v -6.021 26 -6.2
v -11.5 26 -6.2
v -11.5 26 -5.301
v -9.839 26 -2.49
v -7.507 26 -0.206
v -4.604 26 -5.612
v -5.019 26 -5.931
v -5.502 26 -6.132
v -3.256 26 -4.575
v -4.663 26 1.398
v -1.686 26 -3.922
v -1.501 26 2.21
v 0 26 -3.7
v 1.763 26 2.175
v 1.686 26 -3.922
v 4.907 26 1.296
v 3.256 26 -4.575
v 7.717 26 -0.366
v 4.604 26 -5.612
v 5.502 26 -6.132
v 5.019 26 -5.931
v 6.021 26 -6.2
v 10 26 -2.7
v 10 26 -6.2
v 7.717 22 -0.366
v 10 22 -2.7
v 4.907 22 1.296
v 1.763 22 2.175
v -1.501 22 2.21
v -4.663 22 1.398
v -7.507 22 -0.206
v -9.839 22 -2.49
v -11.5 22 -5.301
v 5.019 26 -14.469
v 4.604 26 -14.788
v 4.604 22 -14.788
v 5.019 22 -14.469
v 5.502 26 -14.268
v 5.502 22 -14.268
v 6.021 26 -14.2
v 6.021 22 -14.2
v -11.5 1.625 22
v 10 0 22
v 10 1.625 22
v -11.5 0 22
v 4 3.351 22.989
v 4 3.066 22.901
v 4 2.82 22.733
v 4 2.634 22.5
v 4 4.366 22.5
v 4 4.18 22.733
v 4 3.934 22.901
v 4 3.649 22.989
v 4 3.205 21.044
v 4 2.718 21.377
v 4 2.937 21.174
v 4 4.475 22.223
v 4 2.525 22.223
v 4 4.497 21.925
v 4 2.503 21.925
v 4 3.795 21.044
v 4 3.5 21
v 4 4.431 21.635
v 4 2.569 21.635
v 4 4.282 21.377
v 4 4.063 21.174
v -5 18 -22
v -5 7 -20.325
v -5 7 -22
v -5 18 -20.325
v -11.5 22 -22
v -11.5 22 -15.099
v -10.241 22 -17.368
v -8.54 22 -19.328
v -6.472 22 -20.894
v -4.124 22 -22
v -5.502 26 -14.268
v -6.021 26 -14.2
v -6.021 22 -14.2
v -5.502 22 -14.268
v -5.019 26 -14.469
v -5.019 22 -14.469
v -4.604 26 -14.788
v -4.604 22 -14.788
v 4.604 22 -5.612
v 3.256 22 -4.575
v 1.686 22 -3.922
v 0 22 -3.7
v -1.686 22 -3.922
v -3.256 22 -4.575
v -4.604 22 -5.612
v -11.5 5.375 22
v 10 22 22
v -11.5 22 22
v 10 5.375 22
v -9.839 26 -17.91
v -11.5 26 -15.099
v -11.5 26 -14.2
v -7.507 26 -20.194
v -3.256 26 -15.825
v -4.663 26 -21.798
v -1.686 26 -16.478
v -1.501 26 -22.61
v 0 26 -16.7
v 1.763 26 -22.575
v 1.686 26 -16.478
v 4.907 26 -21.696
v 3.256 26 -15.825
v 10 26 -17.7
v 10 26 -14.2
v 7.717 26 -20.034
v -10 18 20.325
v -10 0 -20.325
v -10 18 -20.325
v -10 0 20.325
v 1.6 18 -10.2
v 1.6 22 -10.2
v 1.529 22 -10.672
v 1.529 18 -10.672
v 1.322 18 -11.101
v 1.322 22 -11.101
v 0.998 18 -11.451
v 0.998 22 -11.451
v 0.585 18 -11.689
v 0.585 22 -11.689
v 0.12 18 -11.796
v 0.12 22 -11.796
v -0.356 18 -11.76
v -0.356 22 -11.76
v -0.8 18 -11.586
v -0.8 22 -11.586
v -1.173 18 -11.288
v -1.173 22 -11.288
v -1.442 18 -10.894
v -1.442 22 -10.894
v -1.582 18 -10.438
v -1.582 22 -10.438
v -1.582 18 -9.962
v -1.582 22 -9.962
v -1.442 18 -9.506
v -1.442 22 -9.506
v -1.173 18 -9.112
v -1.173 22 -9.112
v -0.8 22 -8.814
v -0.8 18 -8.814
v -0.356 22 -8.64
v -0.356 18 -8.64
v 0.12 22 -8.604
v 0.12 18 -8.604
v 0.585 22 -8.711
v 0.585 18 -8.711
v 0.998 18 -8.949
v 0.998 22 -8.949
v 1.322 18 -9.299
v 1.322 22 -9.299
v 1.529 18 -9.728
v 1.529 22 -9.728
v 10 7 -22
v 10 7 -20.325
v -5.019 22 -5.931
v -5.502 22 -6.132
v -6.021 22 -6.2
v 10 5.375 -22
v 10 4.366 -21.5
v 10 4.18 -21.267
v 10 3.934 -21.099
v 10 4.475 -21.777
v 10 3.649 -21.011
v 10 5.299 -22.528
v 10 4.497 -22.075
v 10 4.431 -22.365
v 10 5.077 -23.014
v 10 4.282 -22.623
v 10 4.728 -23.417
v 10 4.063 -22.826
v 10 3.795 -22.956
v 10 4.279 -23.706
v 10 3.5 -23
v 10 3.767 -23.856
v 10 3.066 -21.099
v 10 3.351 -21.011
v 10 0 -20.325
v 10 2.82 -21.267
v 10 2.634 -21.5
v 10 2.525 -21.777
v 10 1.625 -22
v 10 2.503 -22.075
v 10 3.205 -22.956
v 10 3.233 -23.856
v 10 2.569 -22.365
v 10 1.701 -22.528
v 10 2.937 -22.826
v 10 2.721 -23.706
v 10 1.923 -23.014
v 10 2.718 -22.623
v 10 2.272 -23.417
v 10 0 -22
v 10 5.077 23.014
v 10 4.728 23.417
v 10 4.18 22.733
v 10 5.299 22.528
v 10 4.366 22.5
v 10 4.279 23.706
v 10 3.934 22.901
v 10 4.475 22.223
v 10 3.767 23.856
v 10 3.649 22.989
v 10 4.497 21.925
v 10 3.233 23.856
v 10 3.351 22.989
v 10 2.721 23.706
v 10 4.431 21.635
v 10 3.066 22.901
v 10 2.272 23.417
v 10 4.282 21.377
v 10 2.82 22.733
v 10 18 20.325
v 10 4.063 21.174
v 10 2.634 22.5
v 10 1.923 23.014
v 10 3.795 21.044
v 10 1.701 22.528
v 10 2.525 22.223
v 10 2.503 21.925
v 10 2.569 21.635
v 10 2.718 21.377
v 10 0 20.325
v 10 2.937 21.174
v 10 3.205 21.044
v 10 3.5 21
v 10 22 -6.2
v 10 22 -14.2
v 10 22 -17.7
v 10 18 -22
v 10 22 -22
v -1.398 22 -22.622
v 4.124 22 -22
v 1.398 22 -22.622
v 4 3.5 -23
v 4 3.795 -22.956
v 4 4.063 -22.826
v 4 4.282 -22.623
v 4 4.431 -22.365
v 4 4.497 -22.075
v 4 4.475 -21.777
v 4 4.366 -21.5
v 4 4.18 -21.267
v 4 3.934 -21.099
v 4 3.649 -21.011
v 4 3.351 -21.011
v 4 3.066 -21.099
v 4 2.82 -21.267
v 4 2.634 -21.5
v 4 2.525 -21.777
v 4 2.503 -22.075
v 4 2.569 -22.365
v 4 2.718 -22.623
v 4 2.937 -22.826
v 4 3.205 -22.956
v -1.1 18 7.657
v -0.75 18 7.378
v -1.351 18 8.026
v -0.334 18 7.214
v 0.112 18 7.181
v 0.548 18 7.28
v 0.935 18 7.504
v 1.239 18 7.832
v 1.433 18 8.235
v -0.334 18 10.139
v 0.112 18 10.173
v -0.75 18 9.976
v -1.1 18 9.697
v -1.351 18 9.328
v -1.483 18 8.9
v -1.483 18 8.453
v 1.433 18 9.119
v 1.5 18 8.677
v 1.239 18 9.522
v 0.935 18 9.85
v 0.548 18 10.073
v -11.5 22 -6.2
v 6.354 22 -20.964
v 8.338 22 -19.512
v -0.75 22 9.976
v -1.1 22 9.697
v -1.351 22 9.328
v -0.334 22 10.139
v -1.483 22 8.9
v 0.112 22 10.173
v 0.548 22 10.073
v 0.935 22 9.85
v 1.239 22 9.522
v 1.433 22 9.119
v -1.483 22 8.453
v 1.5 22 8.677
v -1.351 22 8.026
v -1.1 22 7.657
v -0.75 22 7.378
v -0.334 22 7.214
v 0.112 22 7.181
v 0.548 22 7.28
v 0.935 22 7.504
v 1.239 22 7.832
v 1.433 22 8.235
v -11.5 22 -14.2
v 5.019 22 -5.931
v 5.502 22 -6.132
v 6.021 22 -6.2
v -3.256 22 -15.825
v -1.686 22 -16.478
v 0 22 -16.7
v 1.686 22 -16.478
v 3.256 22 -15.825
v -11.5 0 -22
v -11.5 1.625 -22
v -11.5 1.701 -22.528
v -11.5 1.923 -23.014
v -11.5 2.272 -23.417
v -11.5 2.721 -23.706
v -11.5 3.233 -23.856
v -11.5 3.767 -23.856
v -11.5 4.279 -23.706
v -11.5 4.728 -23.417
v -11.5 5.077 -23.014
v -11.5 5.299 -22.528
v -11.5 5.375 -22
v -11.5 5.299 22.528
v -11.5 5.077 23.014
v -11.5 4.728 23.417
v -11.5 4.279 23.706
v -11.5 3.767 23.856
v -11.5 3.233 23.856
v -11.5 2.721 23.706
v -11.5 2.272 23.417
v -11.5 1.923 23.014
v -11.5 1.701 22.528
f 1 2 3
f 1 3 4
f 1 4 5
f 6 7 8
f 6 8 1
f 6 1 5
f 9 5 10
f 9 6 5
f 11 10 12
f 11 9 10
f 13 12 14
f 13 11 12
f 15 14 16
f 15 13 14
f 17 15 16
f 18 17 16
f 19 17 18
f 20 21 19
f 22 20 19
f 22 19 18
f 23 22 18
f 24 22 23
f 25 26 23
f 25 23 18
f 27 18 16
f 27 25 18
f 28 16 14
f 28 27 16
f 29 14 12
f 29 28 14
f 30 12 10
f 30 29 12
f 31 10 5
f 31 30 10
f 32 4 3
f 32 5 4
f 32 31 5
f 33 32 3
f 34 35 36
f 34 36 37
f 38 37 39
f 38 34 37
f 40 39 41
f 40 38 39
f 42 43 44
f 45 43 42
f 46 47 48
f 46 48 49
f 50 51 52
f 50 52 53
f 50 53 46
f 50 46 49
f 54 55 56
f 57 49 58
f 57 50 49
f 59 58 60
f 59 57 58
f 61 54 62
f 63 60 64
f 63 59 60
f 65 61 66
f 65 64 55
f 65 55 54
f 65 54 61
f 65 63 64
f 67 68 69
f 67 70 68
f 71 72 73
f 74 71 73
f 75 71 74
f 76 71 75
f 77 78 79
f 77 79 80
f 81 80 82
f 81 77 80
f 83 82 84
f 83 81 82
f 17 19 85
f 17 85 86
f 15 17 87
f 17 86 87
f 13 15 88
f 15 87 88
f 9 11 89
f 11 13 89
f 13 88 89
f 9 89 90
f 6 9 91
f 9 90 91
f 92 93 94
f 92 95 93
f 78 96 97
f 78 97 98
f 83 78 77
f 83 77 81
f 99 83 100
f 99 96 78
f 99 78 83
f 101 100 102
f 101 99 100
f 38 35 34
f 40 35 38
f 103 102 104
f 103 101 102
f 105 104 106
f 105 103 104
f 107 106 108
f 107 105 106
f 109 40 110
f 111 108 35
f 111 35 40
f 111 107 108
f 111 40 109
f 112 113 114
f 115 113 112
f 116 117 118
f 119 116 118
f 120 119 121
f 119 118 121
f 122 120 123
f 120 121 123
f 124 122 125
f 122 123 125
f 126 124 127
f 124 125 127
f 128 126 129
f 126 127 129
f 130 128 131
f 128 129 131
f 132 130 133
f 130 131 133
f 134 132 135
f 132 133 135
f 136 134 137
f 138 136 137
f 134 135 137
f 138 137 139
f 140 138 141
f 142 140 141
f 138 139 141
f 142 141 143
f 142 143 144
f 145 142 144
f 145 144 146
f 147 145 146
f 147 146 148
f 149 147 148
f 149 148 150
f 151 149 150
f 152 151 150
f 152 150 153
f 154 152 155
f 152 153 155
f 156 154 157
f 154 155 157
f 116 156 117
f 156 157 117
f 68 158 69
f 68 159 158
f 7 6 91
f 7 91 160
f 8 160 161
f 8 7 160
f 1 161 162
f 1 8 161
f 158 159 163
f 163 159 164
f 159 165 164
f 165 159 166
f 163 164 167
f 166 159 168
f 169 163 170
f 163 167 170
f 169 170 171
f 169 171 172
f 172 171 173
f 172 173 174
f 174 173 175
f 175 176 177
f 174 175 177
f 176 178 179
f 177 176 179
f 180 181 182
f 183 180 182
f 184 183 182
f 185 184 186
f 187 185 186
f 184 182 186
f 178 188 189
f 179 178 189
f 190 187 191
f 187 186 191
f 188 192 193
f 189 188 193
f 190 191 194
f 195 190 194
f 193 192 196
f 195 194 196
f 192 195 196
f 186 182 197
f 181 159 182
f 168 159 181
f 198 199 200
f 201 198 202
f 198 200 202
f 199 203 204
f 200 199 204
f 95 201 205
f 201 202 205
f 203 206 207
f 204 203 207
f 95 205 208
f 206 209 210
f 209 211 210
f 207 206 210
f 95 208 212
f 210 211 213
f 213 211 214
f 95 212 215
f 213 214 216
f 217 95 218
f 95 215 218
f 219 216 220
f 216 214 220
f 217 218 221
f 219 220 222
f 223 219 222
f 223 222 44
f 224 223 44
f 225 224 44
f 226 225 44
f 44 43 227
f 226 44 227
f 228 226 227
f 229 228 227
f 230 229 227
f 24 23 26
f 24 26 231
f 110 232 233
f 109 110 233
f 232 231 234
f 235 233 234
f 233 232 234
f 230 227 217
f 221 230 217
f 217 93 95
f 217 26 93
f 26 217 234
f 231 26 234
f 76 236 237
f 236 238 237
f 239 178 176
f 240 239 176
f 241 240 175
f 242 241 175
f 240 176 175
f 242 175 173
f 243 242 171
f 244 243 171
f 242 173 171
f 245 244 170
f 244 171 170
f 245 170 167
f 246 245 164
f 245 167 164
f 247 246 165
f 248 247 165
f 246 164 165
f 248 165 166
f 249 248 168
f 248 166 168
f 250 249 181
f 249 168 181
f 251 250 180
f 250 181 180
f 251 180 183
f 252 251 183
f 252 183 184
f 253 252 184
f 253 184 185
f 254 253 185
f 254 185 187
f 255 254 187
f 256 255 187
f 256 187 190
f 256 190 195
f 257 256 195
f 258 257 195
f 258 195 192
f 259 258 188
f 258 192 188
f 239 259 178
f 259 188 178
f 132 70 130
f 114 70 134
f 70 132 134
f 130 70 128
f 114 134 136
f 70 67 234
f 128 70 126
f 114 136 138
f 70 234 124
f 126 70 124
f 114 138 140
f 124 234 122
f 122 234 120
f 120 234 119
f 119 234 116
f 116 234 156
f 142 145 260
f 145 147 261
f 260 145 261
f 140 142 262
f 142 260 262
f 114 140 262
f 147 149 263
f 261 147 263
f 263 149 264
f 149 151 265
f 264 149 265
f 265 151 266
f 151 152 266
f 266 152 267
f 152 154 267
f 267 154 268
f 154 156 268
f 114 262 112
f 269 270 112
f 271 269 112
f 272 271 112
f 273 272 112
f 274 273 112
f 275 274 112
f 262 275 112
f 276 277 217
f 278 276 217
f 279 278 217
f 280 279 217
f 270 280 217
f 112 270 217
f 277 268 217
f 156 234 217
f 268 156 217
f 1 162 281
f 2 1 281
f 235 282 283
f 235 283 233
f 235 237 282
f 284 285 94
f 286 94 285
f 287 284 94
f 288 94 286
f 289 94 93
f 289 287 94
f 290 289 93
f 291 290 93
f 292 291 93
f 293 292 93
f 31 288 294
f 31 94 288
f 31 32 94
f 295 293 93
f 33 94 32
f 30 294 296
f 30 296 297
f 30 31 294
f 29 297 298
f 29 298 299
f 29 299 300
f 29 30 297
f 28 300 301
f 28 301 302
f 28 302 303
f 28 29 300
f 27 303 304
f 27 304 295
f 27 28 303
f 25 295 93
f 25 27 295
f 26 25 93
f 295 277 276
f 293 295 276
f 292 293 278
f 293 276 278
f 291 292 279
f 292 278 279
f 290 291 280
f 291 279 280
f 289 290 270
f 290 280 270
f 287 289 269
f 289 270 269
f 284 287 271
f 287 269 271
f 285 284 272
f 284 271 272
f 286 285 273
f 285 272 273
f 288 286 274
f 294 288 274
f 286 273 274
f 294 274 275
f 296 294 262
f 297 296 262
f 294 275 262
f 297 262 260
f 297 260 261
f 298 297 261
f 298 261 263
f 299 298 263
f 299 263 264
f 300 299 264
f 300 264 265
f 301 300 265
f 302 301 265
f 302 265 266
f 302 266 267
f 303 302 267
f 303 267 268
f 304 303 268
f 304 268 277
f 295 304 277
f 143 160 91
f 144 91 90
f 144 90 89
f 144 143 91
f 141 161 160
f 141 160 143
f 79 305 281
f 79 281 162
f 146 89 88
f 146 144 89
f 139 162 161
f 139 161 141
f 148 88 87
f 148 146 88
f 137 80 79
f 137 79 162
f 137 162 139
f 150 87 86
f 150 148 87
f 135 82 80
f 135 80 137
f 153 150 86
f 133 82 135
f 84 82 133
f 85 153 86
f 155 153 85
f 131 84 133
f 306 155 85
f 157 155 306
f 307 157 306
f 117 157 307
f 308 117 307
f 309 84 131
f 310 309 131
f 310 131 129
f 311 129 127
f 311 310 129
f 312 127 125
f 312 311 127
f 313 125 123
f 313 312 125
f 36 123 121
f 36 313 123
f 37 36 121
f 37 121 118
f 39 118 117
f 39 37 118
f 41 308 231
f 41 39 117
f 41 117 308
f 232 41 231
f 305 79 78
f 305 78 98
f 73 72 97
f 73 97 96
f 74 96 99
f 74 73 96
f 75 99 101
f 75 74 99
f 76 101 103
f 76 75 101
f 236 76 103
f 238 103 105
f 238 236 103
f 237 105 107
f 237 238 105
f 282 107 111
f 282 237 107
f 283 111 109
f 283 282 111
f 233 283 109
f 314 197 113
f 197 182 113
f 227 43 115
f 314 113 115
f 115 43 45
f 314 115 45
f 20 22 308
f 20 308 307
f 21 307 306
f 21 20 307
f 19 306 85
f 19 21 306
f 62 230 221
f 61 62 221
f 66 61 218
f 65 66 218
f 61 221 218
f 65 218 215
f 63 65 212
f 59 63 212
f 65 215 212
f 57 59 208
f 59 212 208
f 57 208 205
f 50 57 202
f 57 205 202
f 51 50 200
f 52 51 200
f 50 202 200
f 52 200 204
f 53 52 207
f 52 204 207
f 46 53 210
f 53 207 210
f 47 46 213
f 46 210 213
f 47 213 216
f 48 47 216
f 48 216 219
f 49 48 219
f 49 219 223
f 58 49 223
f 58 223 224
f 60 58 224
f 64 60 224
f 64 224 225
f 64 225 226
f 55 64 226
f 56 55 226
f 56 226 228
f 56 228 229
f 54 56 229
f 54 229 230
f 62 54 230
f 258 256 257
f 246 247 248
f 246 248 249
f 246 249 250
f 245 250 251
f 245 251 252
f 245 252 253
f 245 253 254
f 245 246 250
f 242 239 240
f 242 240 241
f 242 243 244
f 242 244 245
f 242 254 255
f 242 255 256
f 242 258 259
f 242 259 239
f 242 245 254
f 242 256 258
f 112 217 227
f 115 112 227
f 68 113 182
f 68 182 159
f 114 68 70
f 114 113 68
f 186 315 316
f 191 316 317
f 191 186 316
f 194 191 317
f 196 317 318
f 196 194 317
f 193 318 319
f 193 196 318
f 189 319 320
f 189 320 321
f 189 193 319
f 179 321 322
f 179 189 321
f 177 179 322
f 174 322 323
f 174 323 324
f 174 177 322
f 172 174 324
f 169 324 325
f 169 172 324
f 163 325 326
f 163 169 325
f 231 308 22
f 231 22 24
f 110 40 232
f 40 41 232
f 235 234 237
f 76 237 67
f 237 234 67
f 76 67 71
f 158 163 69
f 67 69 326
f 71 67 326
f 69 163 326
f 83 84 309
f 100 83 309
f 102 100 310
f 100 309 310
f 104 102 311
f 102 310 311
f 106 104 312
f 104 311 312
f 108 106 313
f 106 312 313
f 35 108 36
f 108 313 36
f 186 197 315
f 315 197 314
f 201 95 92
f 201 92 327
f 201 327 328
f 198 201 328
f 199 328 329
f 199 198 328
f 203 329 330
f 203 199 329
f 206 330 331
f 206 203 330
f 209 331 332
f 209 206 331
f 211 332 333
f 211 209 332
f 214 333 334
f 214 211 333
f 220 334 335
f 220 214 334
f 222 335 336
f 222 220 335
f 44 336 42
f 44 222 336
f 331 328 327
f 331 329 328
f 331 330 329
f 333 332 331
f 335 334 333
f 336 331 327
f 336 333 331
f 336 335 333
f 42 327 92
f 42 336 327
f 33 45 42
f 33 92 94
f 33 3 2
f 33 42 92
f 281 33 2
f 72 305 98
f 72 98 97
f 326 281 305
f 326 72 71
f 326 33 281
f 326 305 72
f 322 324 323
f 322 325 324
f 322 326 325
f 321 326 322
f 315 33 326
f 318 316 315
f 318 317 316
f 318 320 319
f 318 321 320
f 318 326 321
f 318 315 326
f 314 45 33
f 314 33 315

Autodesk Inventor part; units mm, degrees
ref_plane "YZ Plane" through (0, 0, 0) normal (1, 0, 0) x (0, 1, 0)
ref_plane "XZ Plane" through (0, 0, 0) normal (0, 1, 0) x (-1, 0, 0)
ref_plane "XY Plane" through (0, 0, 0) normal (0, 0, 1) x (1, 0, 0)
sketch "Sketch1" plane through (0, 0, 0) normal (0, 1, 0) x (-1, 0, 0)
  line L0 (-10, -20.125) -> (10, -20.125)
  line L1 (10, -20.125) -> (10, 20.125)
  line L2 (10, 20.125) -> (-10, 20.125)
  line L3 (-10, 20.125) -> (-10, -20.125)
  line L4 (-10, -20.125) -> (10, 20.125) construction
  line L5 (10, -20.125) -> (-10, 20.125) construction
  line L6 (-11.5, -22) -> (11.5, -22)
  line L7 (11.5, -22) -> (11.5, 22)
  line L8 (11.5, 22) -> (-11.5, 22)
  line L9 (-11.5, 22) -> (-11.5, -22)
  line L10 (-11.5, -22) -> (11.5, 22) construction
  line L11 (11.5, -22) -> (-11.5, 22) construction
  line L12 (-10, 20.125) -> (-10, 22)
  line L13 (-10, -20.125) -> (-10, -22)
  point P0 (0, 0)
  dimension "d0" = 20
  dimension "d1" = 40.25
  dimension "d2" = 23
  dimension "d3" = 44
extrude "Extrusion1" add sketch "Sketch1" along normal blind 7 contours L0 L1 L2 L12 L8 L7 L6 L13
sketch "Sketch2" plane through (-11.5, 0, -22) normal (-1, 0, 0) x (0, 0, 1)
  line L0 (44, 0) -> (0, 0)
  line L1 (0, 0) -> (0, 22)
  line L2 (0, 22) -> (44, 22)
  line L3 (44, 22) -> (44, 0)
  point P0 (22, 0)
  dimension "d6" = 44
  dimension "d7" = 22
sketch "Sketch3" plane through (0, 7, 0) normal (0, 1, 0) x (1, 0, 0)
  line L0 (-10, -20.125) -> (-10, 20.125) projected
  line L1 (-10, 20.125) -> (10, 20.125) projected
  line L2 (10, 20.125) -> (10, 22) projected
  line L3 (10, 22) -> (-11.5, 22) projected
  line L4 (-11.5, 22) -> (-11.5, -22) projected
  line L5 (-11.5, -22) -> (10, -22) projected
  line L6 (10, -22) -> (10, -20.125) projected
  line L7 (10, -20.125) -> (-10, -20.125) projected
  line L8 (-10, 20.125) -> (-10, 22)
  point P0 (0, 0)
extrude "Extrusion2" add sketch "Sketch3" along normal blind 11 contours L7 L6 L5 L4 L3 L8 L0
sketch "Sketch4" plane through (0, 18, 0) normal (0, 1, 0) x (1, 0, 0)
  line L0 (10, -22) -> (10, -20.125) projected
  line L1 (-10, 22) -> (-11.5, 22) projected
  line L2 (10, -22) -> (-11.5, -22)
  line L3 (-11.5, -22) -> (-11.5, 22)
  line L4 (-11.5, 22) -> (10, 22)
  line L5 (10, 22) -> (10, -22)
  point P0 (0, 0)
extrude "Extrusion3" add sketch "Sketch4" along normal blind 4
sketch "Sketch5" plane through (0, 22, 0) normal (0, 1, 0) x (1, 0, 0)
  line L0 (10, 20.125) -> (10, 22) projected
  line L1 (10, 22) -> (-11.5, 22) projected
  line L2 (10, 22) -> (-11.5, 22)
  circle A0 centre (0, 10.2) radius 6.5
  circle A1 centre (0, 10.2) radius 9
  line L3 (0, 10.2) -> (-11.5, 10.2)
  line L4 (-11.5, 22) -> (-11.5, -22) projected
  line L5 (0, 10.2) -> (0, 14.2)
  line L6 (0, 14.2) -> (-11.5, 14.2)
  line L7 (0, 10.2) -> (0, 6.2)
  line L8 (0, 6.2) -> (-11.5, 6.2)
  line L9 (0, 6.2) -> (10, 6.2)
  line L10 (0, 14.2) -> (10, 14.2)
  line L11 (10, -22) -> (10, 22) projected
  line L12 (-11.5, -22) -> (10, -22) projected
  line L13 (10, -22) -> (10, 22) projected
  line L14 (10, 22) -> (-11.5, 22) projected
  line L15 (-11.5, 22) -> (-11.5, -22) projected
  point P0 (0, 0)
  point P1 (0, 22)
  point P2 (5.1235, 14.2)
  point P3 (8.0623, 14.2)
  point P4 (-8.0623, 14.2)
  point P5 (-5.1235, 14.2)
  point P6 (8.0623, 6.2)
  point P7 (5.1235, 6.2)
  point P8 (-5.1235, 6.2)
  point P9 (-8.0623, 6.2)
  dimension "d12" = 11.8
  dimension "d13" = 13
  dimension "d14" = 18
  dimension "d15" = 4
  dimension "d16" = 4
extrude "Extrusion4" add sketch "Sketch5" along normal blind 4 contours L10 A0 L6 A1 | A1 L8 A0 L9
fillet "Fillet1" radius 2 4 edges at (-5.1235, 24, -14.2) (5.1235, 24, -14.2) (-5.1235, 24, -6.2) (5.1235, 24, -6.2)
sketch "Sketch6" plane through (0, 22, 0) normal (0, 1, 0) x (1, 0, 0)
  line L0 (8.0623, 14.2) -> (6.0208, 14.2) projected
  arc A0 (4.6041, 14.7882) -> (6.0208, 14.2) centre (6.0208, 16.2) ccw projected
  arc A1 (4.6041, 14.7882) -> (-4.6041, 14.7882) centre (0, 10.2) ccw projected
  arc A2 (-6.0208, 14.2) -> (-4.6041, 14.7882) centre (-6.0208, 16.2) ccw projected
  line L1 (-6.0208, 14.2) -> (-8.0623, 14.2) projected
  arc A3 (8.0623, 14.2) -> (-8.0623, 14.2) centre (0, 10.2) ccw projected
  line L2 (6.0208, 6.2) -> (8.0623, 6.2) projected
  arc A4 (-8.0623, 6.2) -> (8.0623, 6.2) centre (0, 10.2) ccw projected
  line L3 (-8.0623, 6.2) -> (-6.0208, 6.2) projected
  arc A5 (-4.6041, 5.6118) -> (-6.0208, 6.2) centre (-6.0208, 4.2) ccw projected
  arc A6 (-4.6041, 5.6118) -> (4.6041, 5.6118) centre (0, 10.2) ccw projected
  arc A7 (6.0208, 6.2) -> (4.6041, 5.6118) centre (6.0208, 4.2) ccw projected
  line L4 (-11.5, -22) -> (10, -22) projected
  line L5 (10, -22) -> (10, 22) projected
  line L6 (10, 22) -> (-11.5, 22) projected
  line L7 (-11.5, 22) -> (-11.5, -22) projected
  arc A8 (6.0208, 6.2) -> (4.6041, 5.6118) centre (6.0208, 4.2) ccw projected
  arc A9 (-4.6041, 5.6118) -> (4.6041, 5.6118) centre (0, 10.2) ccw projected
  arc A10 (-4.6041, 5.6118) -> (-6.0208, 6.2) centre (-6.0208, 4.2) ccw projected
  line L8 (-6.0208, 6.2) -> (-8.0623, 6.2) projected
  arc A11 (-8.0623, 6.2) -> (8.0623, 6.2) centre (0, 10.2) ccw projected
  line L9 (8.0623, 6.2) -> (6.0208, 6.2) projected
  arc A12 (4.6041, 14.7882) -> (6.0208, 14.2) centre (6.0208, 16.2) ccw projected
  line L10 (6.0208, 14.2) -> (8.0623, 14.2) projected
  arc A13 (8.0623, 14.2) -> (-8.0623, 14.2) centre (0, 10.2) ccw projected
  line L11 (-8.0623, 14.2) -> (-6.0208, 14.2) projected
  arc A14 (-6.0208, 14.2) -> (-4.6041, 14.7882) centre (-6.0208, 16.2) ccw projected
  arc A15 (4.6041, 14.7882) -> (-4.6041, 14.7882) centre (0, 10.2) ccw projected
  line L12 (-8.0623, 6.2) -> (-11.5, 6.2)
  line L13 (-8.0623, 14.2) -> (-11.5, 14.2)
  line L14 (-11.5, 22) -> (-11.5, -22) projected
  line L15 (8.0623, 6.2) -> (10, 6.2)
  line L16 (8.0623, 14.2) -> (10, 14.2)
  circle A16 centre (0, 10.2) radius 12.5
  circle A17 centre (0, 10.2) radius 1.6
  point P0 (0, 0)
  point P1 (-11.5, 5.301)
  point P2 (10, 2.7)
  point P3 (10, 17.7)
  point P4 (-11.5, 15.099)
  dimension "d20" = 25
  dimension "d21" = 3.2
extrude "Extrusion5" add sketch "Sketch6" along normal up to surface (4 mm away) contours A3 L13 L7 A16 L6 L5 L16 | L5 A16 L7 L12 A4 L15 | L6 A16
extrude "Extrusion6" cut sketch "Sketch6" against normal blind 10 contours A17
sketch "Sketch7" plane through (10, 0, -20.125) normal (1, 0, 0) x (0, 0, -1)
  line L0 (0, 0) -> (1.875, 0) projected
  line L1 (1.875, 0) -> (1.875, 7) projected
  line L2 (0, 7) -> (1.875, 7) projected
  line L3 (0, 0) -> (0, 7) projected
  line L4 (-42.125, 0) -> (-40.25, 0) projected
  line L5 (-40.25, 0) -> (-40.25, 18) projected
  line L6 (-40.25, 18) -> (1.875, 18) projected
  line L7 (1.875, 18) -> (1.875, 22) projected
  line L8 (-2.425, 22) -> (1.875, 22) projected
  line L9 (-2.425, 22) -> (-2.425, 26) projected
  line L10 (-2.425, 26) -> (-5.925, 26) projected
  line L11 (-5.925, 22) -> (-5.925, 26) projected
  line L12 (-13.925, 22) -> (-5.925, 22) projected
  line L13 (-13.925, 22) -> (-13.925, 26) projected
  line L14 (-13.925, 26) -> (-17.425, 26) projected
  line L15 (-17.425, 22) -> (-17.425, 26) projected
  line L16 (-42.125, 22) -> (-17.425, 22) projected
  line L17 (-42.125, 0) -> (-42.125, 22) projected
  line L18 (1.875, 0) -> (1.875, 7) projected
  circle A0 centre (1.875, 3.5) radius 1.875
  line L19 (-42.125, 0) -> (-42.125, 22) projected
  circle A1 centre (-42.125, 3.5) radius 1.875
  point P0 (-20.125, 0)
  point P1 (-42.125, 5.375)
  point P2 (-42.125, 1.625)
  point P3 (1.875, 5.375)
  point P4 (1.875, 1.625)
  dimension "d26" = 3.75
  dimension "d27" = 3.75
extrude "Extrusion7" add sketch "Sketch7" against normal up to surface (21.5 mm away) contours L1 A0 | A1 L17 picked at (2.2647, 3.9886) picked at (-43.0085, 3.7216)
sketch "Sketch8" plane through (10, 0, -20.125) normal (1, 0, 0) x (0, 0, -1)
  line L0 (0, 0) -> (1.875, 0) projected
  line L1 (1.875, 0) -> (1.875, 1.625) projected
  arc A0 (1.875, 1.625) -> (1.875, 5.375) centre (1.875, 3.5) ccw projected
  line L2 (1.875, 5.375) -> (1.875, 7) projected
  line L3 (0, 7) -> (1.875, 7) projected
  line L4 (0, 0) -> (0, 7) projected
  line L5 (-42.125, 0) -> (-40.25, 0) projected
  line L6 (-40.25, 0) -> (-40.25, 18) projected
  line L7 (-40.25, 18) -> (1.875, 18) projected
  line L8 (1.875, 18) -> (1.875, 22) projected
  line L9 (-2.425, 22) -> (1.875, 22) projected
  line L10 (-2.425, 22) -> (-2.425, 26) projected
  line L11 (-2.425, 26) -> (-5.925, 26) projected
  line L12 (-5.925, 22) -> (-5.925, 26) projected
  line L13 (-13.925, 22) -> (-5.925, 22) projected
  line L14 (-13.925, 22) -> (-13.925, 26) projected
  line L15 (-13.925, 26) -> (-17.425, 26) projected
  line L16 (-17.425, 22) -> (-17.425, 26) projected
  line L17 (-42.125, 22) -> (-17.425, 22) projected
  line L18 (-42.125, 5.375) -> (-42.125, 22) projected
  arc A1 (-42.125, 5.375) -> (-42.125, 1.625) centre (-42.125, 3.5) ccw projected
  line L19 (-42.125, 0) -> (-42.125, 1.625) projected
  circle A2 centre (-42.125, 3.5) radius 1
  circle A3 centre (1.875, 3.5) radius 1
  point P0 (-20.125, 0)
  dimension "d30" = 2
  dimension "d31" = 2
extrude "Extrusion8" cut sketch "Sketch8" against normal blind 6 contours A2 | A3
sketch "Sketch9" plane through (10, 0, 22) normal (1, 0, 0) x (0, 0, -1)
  line L0 (1.875, 0) -> (1.875, 18) projected
  line L1 (44, 0) -> (0, 0) projected
  line L2 (1.875, 18) -> (1.675, 18)
  line L3 (1.675, 18) -> (1.675, 0)
  line L4 (1.675, 0) -> (1.875, 0)
  line L5 (1.875, 0) -> (1.875, 18)
  line L6 (42.125, 0) -> (42.125, 7) projected
  line L7 (42.125, 0) -> (44, 0) projected
  line L8 (42.125, 7) -> (42.325, 7)
  line L9 (42.325, 7) -> (42.325, 0)
  line L10 (42.325, 0) -> (42.125, 0)
  line L11 (42.125, 0) -> (42.125, 7)
  point P0 (22, 0)
  dimension "d34" = 0.2
  dimension "d35" = 0.2
extrude "Extrusion9" cut sketch "Sketch9" against normal up to surface (20 mm away)
sketch "Sketch10" plane through (-10, 7, -22) normal (1, 0, 0) x (0, 0, -1)
  line L0 (-42.325, -7) -> (-1.675, -7) projected
  line L1 (-1.675, 0) -> (-1.675, -7) projected
  line L2 (0, 0) -> (-1.675, 0) projected
  line L3 (0, 0) -> (0, 11) projected
  line L4 (-42.325, 11) -> (0, 11) projected
  line L5 (-42.325, -7) -> (-42.325, 11) projected
  line L6 (0, 0) -> (-1.675, 0)
  line L7 (-1.675, 0) -> (-1.675, 11)
  line L8 (-1.675, 11) -> (0, 11)
  line L9 (0, 11) -> (0, 0)
  point P0 (-22, -7)
extrude "Extrusion10" add sketch "Sketch10" along normal blind 5 contours L7 L4 L3 L2
sketch "Sketch11" plane through (0, 18, 0) normal (0, -1, 0) x (1, 0, 0)
  circle A0 centre (0, 8.6768) radius 1.5
  point P0 (0, 0)
  dimension "d40" = 3
extrude "Extrusion11" cut sketch "Sketch11" against normal blind 5
properties part number "Gripper3overhead_3DPrint"
